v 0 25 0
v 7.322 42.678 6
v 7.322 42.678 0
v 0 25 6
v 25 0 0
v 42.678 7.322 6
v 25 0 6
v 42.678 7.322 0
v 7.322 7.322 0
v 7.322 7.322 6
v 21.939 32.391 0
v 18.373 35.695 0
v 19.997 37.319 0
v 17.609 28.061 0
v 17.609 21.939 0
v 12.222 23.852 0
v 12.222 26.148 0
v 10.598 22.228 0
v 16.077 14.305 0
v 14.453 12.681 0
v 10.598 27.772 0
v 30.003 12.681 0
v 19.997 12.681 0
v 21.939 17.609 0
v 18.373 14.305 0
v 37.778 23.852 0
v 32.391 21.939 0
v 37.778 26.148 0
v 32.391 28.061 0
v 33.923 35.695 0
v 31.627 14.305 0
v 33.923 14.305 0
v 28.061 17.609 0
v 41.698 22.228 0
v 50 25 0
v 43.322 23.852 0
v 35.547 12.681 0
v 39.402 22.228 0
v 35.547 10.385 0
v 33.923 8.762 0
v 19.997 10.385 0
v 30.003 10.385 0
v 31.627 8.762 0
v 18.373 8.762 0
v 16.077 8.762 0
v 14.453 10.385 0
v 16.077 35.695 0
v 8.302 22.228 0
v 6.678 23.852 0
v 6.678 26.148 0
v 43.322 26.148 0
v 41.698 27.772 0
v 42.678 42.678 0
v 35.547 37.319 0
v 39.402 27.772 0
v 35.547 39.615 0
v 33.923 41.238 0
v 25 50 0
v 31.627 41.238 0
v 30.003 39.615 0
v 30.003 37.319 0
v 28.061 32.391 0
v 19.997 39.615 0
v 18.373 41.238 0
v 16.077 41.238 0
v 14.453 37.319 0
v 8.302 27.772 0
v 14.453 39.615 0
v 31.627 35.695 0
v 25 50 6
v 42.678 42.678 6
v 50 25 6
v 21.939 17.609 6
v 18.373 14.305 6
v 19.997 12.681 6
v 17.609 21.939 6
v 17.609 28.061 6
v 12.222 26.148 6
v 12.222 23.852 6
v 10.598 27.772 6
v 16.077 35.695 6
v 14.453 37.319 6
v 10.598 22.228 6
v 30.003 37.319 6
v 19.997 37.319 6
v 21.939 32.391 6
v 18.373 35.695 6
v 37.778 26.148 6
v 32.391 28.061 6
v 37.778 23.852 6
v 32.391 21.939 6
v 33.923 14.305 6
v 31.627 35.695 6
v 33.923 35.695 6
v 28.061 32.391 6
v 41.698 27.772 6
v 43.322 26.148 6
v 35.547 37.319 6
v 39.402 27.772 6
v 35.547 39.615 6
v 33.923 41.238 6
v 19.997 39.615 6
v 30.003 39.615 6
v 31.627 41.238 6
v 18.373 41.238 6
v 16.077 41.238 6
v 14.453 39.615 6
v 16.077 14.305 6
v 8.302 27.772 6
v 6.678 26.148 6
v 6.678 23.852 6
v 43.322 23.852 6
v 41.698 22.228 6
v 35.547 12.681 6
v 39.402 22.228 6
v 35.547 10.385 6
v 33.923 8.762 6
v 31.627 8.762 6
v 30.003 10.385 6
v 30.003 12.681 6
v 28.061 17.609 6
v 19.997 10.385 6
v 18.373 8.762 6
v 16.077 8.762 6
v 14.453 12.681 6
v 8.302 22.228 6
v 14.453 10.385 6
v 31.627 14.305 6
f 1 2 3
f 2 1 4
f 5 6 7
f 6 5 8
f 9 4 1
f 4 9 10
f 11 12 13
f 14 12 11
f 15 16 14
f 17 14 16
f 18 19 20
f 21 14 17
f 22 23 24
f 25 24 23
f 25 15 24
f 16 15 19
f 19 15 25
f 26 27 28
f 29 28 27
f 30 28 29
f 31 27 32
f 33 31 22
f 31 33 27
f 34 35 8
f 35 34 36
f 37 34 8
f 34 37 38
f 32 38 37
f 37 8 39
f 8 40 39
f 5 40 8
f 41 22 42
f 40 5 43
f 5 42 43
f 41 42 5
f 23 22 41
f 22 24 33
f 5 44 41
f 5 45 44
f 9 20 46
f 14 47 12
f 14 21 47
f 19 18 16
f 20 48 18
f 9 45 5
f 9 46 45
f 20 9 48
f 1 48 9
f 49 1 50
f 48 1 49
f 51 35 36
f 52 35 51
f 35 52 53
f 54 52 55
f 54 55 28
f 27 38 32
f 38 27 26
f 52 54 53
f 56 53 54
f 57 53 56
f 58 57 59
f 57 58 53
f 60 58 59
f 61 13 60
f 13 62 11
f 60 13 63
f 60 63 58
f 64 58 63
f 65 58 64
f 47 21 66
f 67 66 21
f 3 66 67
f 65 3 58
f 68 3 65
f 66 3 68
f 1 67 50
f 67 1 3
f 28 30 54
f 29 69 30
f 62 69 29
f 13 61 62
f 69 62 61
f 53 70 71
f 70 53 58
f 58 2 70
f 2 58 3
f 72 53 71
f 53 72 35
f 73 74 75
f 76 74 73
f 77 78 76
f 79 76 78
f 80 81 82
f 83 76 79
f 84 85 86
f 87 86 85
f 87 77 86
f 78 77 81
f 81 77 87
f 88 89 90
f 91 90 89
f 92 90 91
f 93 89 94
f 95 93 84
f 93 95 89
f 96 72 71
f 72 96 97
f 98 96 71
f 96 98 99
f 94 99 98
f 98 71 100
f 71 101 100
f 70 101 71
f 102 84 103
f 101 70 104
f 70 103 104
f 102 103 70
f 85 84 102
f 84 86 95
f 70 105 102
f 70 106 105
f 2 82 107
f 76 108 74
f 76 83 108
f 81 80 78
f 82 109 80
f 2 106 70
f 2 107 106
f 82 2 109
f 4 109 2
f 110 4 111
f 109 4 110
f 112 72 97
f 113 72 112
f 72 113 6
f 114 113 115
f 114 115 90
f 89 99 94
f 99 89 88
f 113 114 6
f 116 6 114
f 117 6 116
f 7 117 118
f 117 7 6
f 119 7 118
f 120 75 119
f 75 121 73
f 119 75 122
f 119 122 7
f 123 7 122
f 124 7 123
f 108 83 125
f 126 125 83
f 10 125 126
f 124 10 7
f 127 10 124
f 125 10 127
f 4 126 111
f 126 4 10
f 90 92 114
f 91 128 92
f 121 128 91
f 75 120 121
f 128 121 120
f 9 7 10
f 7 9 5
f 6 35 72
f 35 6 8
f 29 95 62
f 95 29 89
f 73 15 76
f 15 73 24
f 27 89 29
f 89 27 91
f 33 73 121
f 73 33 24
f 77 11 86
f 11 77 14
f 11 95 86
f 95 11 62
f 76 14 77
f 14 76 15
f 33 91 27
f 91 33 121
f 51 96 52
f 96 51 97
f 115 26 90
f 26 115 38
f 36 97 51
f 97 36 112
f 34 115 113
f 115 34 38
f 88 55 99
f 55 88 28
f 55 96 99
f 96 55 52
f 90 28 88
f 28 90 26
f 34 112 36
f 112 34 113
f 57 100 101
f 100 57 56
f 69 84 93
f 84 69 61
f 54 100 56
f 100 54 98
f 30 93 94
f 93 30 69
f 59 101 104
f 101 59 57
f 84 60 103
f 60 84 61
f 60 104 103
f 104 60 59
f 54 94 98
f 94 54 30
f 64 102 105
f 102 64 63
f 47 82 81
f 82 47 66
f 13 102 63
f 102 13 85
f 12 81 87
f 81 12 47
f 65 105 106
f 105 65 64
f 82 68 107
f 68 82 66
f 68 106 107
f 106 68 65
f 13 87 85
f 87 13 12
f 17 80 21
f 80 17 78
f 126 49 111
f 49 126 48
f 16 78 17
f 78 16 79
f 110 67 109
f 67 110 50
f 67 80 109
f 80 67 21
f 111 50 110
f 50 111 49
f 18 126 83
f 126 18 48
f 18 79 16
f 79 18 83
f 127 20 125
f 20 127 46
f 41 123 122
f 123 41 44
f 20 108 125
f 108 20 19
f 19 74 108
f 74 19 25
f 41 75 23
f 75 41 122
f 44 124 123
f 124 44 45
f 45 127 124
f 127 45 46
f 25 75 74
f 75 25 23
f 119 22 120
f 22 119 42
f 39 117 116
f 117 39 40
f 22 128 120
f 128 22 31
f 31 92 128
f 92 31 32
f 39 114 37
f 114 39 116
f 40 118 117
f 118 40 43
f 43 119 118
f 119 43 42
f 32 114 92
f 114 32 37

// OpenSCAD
$fn = 32;

// ----------------------------------------------------------------------
// Polygon plate: 8-gon R25, 6 bolt windows
// ----------------------------------------------------------------------

// --- parameters (mm) ---
sides = 8;                // number of polygon sides
plate_r = 25;             // circumscribed radius of the polygon
bore_r = 8;               // centre bore radius
bolts = 6;                // number of bolt windows
ring_r = 15.55;           // bolt-circle radius
bolt_r = 3;               // bolt window radius
plate_t = 6;              // plate thickness, Z (extrusion height)

plate_d = 2 * plate_r;  // circumscribed diameter
bore_d = 2 * bore_r;  // centre bore diameter
bolt_d = 2 * bolt_r;  // bolt window diameter
ring_d = 2 * ring_r;  // bolt-circle diameter

profile = [[50, 25], [42.678, 42.678], [25, 50], [7.322, 42.678], [0, 25], [7.322, 7.322], [25, 0], [42.678, 7.322]];  // primary outline, 8 points, counter clockwise
void_1 = [[32.391, 28.061], [28.061, 32.391], [21.939, 32.391], [17.609, 28.061], [17.609, 21.939], [21.939, 17.609], [28.061, 17.609], [32.391, 21.939]];  // centre bore, 8 points
void_2 = [[43.322, 26.148], [41.698, 27.772], [39.402, 27.772], [37.778, 26.148], [37.778, 23.852], [39.402, 22.228], [41.698, 22.228], [43.322, 23.852]];  // bolt window 1, 8 points
void_3 = [[35.547, 39.615], [33.923, 41.238], [31.627, 41.238], [30.003, 39.615], [30.003, 37.319], [31.627, 35.695], [33.923, 35.695], [35.547, 37.319]];  // bolt window 2, 8 points
void_4 = [[19.997, 39.615], [18.373, 41.238], [16.077, 41.238], [14.453, 39.615], [14.453, 37.319], [16.077, 35.695], [18.373, 35.695], [19.997, 37.319]];  // bolt window 3, 8 points
void_5 = [[12.222, 26.148], [10.598, 27.772], [8.302, 27.772], [6.678, 26.148], [6.678, 23.852], [8.302, 22.228], [10.598, 22.228], [12.222, 23.852]];  // bolt window 4, 8 points
void_6 = [[19.997, 12.681], [18.373, 14.305], [16.077, 14.305], [14.453, 12.681], [14.453, 10.385], [16.077, 8.762], [18.373, 8.762], [19.997, 10.385]];  // bolt window 5, 8 points
void_7 = [[35.547, 12.681], [33.923, 14.305], [31.627, 14.305], [30.003, 12.681], [30.003, 10.385], [31.627, 8.762], [33.923, 8.762], [35.547, 10.385]];  // bolt window 6, 8 points

// --- the one profile operation ---
difference() {
  linear_extrude(height = plate_t) polygon(points = profile);
  translate([0, 0, -1])
    linear_extrude(height = plate_t + 2) polygon(points = void_1);
  translate([0, 0, -1])
    linear_extrude(height = plate_t + 2) polygon(points = void_2);
  translate([0, 0, -1])
    linear_extrude(height = plate_t + 2) polygon(points = void_3);
  translate([0, 0, -1])
    linear_extrude(height = plate_t + 2) polygon(points = void_4);
  translate([0, 0, -1])
    linear_extrude(height = plate_t + 2) polygon(points = void_5);
  translate([0, 0, -1])
    linear_extrude(height = plate_t + 2) polygon(points = void_6);
  translate([0, 0, -1])
    linear_extrude(height = plate_t + 2) polygon(points = void_7);
}
